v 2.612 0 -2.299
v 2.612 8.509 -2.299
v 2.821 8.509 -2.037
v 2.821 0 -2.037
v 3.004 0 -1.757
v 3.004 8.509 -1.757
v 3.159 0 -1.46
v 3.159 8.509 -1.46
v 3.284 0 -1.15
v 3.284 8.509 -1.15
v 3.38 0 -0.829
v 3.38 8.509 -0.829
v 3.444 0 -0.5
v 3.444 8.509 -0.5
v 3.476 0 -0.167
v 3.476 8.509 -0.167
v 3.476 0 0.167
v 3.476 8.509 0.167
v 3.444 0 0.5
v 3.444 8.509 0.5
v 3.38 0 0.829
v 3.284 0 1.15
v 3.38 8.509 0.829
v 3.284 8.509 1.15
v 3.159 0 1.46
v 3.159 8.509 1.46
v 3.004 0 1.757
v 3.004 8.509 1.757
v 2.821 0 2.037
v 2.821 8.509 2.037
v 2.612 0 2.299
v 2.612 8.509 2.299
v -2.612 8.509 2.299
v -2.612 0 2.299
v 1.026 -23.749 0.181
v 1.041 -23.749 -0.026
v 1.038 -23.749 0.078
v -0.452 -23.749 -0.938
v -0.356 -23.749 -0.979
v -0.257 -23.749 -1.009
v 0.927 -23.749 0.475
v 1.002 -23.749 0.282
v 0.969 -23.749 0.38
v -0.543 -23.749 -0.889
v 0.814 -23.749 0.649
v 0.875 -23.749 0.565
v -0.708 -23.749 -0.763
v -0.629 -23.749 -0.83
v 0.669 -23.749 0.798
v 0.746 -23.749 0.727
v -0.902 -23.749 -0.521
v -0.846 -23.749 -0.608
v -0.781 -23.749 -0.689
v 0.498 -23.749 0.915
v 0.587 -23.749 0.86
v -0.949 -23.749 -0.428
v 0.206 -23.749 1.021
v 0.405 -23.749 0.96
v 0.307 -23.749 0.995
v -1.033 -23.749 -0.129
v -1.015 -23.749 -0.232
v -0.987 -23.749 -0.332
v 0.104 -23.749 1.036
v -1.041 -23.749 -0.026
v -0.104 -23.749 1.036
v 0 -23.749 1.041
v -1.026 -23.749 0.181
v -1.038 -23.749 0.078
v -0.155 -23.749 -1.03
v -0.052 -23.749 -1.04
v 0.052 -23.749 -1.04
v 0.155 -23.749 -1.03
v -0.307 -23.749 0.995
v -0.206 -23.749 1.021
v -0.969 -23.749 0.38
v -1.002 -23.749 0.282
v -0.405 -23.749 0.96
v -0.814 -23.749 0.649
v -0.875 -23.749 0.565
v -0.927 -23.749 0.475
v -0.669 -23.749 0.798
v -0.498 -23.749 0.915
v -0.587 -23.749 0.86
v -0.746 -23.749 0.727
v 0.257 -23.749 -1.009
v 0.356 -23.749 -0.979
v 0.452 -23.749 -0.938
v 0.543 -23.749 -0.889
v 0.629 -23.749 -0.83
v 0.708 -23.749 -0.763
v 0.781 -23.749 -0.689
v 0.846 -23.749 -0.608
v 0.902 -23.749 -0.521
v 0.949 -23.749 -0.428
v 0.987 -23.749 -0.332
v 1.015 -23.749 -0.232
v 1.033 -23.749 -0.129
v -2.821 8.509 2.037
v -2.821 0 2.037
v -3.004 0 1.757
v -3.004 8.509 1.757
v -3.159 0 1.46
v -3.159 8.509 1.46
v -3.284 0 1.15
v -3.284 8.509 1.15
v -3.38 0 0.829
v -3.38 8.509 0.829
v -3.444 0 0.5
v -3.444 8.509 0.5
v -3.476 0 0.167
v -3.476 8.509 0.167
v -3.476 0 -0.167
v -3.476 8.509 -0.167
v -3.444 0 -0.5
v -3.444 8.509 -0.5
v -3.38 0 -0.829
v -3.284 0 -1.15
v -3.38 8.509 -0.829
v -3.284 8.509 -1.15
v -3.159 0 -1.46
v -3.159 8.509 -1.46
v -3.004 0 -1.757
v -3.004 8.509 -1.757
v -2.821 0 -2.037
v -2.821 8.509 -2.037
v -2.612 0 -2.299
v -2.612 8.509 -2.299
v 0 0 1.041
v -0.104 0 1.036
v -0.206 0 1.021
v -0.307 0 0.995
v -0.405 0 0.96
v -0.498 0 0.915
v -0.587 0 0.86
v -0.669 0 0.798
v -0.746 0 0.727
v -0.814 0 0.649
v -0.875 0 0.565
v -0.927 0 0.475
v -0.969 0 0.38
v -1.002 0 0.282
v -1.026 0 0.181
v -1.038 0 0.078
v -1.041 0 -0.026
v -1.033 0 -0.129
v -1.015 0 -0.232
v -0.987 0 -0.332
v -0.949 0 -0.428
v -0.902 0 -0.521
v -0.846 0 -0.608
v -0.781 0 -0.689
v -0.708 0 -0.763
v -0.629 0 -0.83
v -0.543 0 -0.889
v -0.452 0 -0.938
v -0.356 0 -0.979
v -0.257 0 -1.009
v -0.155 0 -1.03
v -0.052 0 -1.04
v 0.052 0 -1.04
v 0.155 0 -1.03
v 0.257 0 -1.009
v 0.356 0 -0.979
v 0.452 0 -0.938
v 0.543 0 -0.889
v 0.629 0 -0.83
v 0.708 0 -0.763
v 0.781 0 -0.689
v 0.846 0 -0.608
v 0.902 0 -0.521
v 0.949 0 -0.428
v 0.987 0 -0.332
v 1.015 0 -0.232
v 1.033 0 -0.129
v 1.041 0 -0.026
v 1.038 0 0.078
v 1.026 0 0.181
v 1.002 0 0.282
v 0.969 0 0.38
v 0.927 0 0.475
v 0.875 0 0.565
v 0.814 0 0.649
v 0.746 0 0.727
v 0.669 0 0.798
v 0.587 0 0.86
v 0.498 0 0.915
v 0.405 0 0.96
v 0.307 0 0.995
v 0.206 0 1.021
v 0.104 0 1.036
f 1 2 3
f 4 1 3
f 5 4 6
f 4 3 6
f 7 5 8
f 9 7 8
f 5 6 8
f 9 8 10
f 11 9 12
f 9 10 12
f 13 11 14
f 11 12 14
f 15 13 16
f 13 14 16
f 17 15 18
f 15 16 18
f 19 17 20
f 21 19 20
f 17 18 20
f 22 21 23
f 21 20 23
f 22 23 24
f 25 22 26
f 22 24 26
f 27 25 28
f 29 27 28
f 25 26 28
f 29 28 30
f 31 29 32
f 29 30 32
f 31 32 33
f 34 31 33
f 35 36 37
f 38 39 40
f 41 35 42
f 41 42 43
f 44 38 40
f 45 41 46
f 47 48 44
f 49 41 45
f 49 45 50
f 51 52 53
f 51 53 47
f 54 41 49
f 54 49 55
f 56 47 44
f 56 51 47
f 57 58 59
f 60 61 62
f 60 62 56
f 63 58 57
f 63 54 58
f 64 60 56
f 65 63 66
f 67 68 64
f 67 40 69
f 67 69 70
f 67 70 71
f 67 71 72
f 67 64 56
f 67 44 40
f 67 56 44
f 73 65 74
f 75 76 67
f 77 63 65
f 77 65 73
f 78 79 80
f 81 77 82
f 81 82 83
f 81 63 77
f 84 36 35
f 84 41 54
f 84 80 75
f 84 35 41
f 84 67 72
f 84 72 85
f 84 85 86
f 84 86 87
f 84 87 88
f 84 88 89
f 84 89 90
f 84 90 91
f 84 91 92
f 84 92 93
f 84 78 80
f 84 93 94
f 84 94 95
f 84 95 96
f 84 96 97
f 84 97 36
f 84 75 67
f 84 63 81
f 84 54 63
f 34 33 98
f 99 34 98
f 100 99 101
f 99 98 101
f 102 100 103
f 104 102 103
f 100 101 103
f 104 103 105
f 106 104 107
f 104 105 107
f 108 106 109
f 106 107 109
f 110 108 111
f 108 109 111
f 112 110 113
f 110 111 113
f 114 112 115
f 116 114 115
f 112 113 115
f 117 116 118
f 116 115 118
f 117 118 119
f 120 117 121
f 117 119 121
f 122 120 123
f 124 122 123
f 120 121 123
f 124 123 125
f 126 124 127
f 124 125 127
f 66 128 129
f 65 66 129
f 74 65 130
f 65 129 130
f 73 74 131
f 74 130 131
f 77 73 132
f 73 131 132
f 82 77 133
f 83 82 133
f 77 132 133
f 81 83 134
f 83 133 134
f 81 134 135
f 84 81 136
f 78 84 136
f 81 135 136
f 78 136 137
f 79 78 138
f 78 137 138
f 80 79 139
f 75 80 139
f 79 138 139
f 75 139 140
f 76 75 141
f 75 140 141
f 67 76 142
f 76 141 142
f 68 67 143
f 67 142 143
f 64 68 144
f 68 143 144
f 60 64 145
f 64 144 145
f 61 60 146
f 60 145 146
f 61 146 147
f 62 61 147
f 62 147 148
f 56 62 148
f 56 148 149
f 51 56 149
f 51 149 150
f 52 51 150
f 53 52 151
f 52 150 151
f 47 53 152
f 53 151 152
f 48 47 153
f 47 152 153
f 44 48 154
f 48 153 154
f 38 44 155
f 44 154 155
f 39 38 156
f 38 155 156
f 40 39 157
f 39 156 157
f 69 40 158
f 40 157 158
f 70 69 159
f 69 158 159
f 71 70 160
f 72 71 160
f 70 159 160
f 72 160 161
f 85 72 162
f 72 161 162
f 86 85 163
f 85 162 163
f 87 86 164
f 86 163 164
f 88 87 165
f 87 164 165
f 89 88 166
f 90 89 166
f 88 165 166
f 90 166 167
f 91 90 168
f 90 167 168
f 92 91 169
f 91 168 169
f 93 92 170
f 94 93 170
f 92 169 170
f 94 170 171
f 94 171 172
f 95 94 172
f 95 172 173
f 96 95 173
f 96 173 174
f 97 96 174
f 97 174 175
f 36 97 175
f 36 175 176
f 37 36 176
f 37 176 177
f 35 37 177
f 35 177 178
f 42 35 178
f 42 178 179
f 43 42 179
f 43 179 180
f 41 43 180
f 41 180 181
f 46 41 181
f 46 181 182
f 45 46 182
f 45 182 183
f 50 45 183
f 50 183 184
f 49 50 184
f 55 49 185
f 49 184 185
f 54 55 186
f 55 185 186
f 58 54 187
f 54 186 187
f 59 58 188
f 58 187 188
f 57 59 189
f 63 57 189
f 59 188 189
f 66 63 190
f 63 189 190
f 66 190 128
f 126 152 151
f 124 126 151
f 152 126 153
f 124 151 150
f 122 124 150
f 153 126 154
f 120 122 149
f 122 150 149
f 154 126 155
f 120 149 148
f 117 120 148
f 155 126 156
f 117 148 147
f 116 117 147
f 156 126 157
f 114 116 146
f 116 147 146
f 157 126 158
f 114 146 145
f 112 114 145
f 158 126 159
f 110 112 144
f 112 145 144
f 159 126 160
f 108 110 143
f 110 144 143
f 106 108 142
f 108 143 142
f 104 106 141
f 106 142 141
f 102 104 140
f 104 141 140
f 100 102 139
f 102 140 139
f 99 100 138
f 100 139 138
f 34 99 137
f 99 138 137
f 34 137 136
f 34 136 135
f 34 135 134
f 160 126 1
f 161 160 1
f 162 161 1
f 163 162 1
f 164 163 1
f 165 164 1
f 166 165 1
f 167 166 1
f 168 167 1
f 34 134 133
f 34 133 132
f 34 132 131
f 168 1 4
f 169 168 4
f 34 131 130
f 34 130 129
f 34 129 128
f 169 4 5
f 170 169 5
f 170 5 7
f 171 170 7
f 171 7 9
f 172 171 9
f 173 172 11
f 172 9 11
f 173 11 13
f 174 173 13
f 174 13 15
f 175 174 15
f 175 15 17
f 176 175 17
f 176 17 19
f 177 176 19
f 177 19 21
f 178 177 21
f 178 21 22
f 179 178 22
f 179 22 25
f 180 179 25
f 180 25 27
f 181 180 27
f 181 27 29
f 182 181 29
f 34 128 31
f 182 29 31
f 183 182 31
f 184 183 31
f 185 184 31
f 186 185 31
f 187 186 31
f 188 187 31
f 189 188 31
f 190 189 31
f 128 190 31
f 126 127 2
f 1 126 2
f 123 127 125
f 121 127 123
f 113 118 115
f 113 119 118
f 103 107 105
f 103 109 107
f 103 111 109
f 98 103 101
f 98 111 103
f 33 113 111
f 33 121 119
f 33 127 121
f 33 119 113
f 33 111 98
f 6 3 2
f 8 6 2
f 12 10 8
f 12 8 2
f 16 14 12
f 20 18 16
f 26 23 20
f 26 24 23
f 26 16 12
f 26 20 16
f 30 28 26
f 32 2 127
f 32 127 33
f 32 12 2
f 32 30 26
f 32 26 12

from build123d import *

# Parameters (mm, degrees)
SKETCH1_R           = 3.4798
BOSS_EXTRUDE1_DEPTH = 8.509
SKETCH2_R           = 1.0414
BOSS_EXTRUDE2_DEPTH = 23.749
SKETCH3_OUTSIDE_W   = 15.706
SKETCH3_OUTSIDE_H   = 15.706
CUT_EXTRUDE1_DEPTH  = 8.509


with BuildPart() as part:
    # Sketch1 → Boss-Extrude1 (new body)
    with BuildSketch(Plane(origin=(0, 0, 0), x_dir=(1, 0, 0), z_dir=(0, 1, 0))):
        with Locations(Location((0, 0, 0), (0, 0, 270))):
            Circle(SKETCH1_R)
    extrude(amount=BOSS_EXTRUDE1_DEPTH)

    # Sketch2 → Boss-Extrude2 (add)
    with BuildSketch(Plane.XZ):
        with Locations(Location((0, 0, 0), (0, 0, 90))):
            Circle(SKETCH2_R)
    extrude(amount=BOSS_EXTRUDE2_DEPTH)

    # Sketch3 outside → Cut-Extrude1 (cut)
    with BuildSketch(Plane(origin=(0, 8.509, 0), x_dir=(1, 0, 0), z_dir=(0, 1, 0))):
        Rectangle(SKETCH3_OUTSIDE_W, SKETCH3_OUTSIDE_H)
        with BuildLine():
            Line((-2.612467483, 2.2987), (2.612467483, 2.2987))
            ThreePointArc((2.612467483, 2.2987), (3.4798, 0), (2.612467483, -2.2987))
            Line((2.612467483, -2.2987), (-2.612467483, -2.2987))
            ThreePointArc((-2.612467483, -2.2987), (-3.4798, 0), (-2.612467483, 2.2987))
        make_face(mode=Mode.SUBTRACT)
    extrude(amount=-CUT_EXTRUDE1_DEPTH, mode=Mode.SUBTRACT)


solid = part.part
